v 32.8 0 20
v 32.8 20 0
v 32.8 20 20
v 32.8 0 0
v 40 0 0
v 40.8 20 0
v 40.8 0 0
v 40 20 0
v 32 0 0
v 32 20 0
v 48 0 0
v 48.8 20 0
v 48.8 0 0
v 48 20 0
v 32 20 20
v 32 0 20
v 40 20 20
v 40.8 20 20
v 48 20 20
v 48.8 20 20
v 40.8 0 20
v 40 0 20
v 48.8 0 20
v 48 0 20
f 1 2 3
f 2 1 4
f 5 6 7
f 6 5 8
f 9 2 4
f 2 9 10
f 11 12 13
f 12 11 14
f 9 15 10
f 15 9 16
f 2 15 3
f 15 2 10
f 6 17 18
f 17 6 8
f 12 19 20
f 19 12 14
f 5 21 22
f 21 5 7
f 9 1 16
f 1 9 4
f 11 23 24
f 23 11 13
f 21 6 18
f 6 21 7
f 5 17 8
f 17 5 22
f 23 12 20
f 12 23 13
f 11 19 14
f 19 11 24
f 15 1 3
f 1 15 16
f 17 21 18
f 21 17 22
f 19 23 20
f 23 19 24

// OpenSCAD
a = 0.8; // [0:5]



intersection(){
    
domino(a,10,10);

translate([30,0,0])
cube([20,20,20]);
    
}


module domino(a){

for (i=[0:10])
translate([i*8,0,0])


cube([a,20,50]);



    
}
